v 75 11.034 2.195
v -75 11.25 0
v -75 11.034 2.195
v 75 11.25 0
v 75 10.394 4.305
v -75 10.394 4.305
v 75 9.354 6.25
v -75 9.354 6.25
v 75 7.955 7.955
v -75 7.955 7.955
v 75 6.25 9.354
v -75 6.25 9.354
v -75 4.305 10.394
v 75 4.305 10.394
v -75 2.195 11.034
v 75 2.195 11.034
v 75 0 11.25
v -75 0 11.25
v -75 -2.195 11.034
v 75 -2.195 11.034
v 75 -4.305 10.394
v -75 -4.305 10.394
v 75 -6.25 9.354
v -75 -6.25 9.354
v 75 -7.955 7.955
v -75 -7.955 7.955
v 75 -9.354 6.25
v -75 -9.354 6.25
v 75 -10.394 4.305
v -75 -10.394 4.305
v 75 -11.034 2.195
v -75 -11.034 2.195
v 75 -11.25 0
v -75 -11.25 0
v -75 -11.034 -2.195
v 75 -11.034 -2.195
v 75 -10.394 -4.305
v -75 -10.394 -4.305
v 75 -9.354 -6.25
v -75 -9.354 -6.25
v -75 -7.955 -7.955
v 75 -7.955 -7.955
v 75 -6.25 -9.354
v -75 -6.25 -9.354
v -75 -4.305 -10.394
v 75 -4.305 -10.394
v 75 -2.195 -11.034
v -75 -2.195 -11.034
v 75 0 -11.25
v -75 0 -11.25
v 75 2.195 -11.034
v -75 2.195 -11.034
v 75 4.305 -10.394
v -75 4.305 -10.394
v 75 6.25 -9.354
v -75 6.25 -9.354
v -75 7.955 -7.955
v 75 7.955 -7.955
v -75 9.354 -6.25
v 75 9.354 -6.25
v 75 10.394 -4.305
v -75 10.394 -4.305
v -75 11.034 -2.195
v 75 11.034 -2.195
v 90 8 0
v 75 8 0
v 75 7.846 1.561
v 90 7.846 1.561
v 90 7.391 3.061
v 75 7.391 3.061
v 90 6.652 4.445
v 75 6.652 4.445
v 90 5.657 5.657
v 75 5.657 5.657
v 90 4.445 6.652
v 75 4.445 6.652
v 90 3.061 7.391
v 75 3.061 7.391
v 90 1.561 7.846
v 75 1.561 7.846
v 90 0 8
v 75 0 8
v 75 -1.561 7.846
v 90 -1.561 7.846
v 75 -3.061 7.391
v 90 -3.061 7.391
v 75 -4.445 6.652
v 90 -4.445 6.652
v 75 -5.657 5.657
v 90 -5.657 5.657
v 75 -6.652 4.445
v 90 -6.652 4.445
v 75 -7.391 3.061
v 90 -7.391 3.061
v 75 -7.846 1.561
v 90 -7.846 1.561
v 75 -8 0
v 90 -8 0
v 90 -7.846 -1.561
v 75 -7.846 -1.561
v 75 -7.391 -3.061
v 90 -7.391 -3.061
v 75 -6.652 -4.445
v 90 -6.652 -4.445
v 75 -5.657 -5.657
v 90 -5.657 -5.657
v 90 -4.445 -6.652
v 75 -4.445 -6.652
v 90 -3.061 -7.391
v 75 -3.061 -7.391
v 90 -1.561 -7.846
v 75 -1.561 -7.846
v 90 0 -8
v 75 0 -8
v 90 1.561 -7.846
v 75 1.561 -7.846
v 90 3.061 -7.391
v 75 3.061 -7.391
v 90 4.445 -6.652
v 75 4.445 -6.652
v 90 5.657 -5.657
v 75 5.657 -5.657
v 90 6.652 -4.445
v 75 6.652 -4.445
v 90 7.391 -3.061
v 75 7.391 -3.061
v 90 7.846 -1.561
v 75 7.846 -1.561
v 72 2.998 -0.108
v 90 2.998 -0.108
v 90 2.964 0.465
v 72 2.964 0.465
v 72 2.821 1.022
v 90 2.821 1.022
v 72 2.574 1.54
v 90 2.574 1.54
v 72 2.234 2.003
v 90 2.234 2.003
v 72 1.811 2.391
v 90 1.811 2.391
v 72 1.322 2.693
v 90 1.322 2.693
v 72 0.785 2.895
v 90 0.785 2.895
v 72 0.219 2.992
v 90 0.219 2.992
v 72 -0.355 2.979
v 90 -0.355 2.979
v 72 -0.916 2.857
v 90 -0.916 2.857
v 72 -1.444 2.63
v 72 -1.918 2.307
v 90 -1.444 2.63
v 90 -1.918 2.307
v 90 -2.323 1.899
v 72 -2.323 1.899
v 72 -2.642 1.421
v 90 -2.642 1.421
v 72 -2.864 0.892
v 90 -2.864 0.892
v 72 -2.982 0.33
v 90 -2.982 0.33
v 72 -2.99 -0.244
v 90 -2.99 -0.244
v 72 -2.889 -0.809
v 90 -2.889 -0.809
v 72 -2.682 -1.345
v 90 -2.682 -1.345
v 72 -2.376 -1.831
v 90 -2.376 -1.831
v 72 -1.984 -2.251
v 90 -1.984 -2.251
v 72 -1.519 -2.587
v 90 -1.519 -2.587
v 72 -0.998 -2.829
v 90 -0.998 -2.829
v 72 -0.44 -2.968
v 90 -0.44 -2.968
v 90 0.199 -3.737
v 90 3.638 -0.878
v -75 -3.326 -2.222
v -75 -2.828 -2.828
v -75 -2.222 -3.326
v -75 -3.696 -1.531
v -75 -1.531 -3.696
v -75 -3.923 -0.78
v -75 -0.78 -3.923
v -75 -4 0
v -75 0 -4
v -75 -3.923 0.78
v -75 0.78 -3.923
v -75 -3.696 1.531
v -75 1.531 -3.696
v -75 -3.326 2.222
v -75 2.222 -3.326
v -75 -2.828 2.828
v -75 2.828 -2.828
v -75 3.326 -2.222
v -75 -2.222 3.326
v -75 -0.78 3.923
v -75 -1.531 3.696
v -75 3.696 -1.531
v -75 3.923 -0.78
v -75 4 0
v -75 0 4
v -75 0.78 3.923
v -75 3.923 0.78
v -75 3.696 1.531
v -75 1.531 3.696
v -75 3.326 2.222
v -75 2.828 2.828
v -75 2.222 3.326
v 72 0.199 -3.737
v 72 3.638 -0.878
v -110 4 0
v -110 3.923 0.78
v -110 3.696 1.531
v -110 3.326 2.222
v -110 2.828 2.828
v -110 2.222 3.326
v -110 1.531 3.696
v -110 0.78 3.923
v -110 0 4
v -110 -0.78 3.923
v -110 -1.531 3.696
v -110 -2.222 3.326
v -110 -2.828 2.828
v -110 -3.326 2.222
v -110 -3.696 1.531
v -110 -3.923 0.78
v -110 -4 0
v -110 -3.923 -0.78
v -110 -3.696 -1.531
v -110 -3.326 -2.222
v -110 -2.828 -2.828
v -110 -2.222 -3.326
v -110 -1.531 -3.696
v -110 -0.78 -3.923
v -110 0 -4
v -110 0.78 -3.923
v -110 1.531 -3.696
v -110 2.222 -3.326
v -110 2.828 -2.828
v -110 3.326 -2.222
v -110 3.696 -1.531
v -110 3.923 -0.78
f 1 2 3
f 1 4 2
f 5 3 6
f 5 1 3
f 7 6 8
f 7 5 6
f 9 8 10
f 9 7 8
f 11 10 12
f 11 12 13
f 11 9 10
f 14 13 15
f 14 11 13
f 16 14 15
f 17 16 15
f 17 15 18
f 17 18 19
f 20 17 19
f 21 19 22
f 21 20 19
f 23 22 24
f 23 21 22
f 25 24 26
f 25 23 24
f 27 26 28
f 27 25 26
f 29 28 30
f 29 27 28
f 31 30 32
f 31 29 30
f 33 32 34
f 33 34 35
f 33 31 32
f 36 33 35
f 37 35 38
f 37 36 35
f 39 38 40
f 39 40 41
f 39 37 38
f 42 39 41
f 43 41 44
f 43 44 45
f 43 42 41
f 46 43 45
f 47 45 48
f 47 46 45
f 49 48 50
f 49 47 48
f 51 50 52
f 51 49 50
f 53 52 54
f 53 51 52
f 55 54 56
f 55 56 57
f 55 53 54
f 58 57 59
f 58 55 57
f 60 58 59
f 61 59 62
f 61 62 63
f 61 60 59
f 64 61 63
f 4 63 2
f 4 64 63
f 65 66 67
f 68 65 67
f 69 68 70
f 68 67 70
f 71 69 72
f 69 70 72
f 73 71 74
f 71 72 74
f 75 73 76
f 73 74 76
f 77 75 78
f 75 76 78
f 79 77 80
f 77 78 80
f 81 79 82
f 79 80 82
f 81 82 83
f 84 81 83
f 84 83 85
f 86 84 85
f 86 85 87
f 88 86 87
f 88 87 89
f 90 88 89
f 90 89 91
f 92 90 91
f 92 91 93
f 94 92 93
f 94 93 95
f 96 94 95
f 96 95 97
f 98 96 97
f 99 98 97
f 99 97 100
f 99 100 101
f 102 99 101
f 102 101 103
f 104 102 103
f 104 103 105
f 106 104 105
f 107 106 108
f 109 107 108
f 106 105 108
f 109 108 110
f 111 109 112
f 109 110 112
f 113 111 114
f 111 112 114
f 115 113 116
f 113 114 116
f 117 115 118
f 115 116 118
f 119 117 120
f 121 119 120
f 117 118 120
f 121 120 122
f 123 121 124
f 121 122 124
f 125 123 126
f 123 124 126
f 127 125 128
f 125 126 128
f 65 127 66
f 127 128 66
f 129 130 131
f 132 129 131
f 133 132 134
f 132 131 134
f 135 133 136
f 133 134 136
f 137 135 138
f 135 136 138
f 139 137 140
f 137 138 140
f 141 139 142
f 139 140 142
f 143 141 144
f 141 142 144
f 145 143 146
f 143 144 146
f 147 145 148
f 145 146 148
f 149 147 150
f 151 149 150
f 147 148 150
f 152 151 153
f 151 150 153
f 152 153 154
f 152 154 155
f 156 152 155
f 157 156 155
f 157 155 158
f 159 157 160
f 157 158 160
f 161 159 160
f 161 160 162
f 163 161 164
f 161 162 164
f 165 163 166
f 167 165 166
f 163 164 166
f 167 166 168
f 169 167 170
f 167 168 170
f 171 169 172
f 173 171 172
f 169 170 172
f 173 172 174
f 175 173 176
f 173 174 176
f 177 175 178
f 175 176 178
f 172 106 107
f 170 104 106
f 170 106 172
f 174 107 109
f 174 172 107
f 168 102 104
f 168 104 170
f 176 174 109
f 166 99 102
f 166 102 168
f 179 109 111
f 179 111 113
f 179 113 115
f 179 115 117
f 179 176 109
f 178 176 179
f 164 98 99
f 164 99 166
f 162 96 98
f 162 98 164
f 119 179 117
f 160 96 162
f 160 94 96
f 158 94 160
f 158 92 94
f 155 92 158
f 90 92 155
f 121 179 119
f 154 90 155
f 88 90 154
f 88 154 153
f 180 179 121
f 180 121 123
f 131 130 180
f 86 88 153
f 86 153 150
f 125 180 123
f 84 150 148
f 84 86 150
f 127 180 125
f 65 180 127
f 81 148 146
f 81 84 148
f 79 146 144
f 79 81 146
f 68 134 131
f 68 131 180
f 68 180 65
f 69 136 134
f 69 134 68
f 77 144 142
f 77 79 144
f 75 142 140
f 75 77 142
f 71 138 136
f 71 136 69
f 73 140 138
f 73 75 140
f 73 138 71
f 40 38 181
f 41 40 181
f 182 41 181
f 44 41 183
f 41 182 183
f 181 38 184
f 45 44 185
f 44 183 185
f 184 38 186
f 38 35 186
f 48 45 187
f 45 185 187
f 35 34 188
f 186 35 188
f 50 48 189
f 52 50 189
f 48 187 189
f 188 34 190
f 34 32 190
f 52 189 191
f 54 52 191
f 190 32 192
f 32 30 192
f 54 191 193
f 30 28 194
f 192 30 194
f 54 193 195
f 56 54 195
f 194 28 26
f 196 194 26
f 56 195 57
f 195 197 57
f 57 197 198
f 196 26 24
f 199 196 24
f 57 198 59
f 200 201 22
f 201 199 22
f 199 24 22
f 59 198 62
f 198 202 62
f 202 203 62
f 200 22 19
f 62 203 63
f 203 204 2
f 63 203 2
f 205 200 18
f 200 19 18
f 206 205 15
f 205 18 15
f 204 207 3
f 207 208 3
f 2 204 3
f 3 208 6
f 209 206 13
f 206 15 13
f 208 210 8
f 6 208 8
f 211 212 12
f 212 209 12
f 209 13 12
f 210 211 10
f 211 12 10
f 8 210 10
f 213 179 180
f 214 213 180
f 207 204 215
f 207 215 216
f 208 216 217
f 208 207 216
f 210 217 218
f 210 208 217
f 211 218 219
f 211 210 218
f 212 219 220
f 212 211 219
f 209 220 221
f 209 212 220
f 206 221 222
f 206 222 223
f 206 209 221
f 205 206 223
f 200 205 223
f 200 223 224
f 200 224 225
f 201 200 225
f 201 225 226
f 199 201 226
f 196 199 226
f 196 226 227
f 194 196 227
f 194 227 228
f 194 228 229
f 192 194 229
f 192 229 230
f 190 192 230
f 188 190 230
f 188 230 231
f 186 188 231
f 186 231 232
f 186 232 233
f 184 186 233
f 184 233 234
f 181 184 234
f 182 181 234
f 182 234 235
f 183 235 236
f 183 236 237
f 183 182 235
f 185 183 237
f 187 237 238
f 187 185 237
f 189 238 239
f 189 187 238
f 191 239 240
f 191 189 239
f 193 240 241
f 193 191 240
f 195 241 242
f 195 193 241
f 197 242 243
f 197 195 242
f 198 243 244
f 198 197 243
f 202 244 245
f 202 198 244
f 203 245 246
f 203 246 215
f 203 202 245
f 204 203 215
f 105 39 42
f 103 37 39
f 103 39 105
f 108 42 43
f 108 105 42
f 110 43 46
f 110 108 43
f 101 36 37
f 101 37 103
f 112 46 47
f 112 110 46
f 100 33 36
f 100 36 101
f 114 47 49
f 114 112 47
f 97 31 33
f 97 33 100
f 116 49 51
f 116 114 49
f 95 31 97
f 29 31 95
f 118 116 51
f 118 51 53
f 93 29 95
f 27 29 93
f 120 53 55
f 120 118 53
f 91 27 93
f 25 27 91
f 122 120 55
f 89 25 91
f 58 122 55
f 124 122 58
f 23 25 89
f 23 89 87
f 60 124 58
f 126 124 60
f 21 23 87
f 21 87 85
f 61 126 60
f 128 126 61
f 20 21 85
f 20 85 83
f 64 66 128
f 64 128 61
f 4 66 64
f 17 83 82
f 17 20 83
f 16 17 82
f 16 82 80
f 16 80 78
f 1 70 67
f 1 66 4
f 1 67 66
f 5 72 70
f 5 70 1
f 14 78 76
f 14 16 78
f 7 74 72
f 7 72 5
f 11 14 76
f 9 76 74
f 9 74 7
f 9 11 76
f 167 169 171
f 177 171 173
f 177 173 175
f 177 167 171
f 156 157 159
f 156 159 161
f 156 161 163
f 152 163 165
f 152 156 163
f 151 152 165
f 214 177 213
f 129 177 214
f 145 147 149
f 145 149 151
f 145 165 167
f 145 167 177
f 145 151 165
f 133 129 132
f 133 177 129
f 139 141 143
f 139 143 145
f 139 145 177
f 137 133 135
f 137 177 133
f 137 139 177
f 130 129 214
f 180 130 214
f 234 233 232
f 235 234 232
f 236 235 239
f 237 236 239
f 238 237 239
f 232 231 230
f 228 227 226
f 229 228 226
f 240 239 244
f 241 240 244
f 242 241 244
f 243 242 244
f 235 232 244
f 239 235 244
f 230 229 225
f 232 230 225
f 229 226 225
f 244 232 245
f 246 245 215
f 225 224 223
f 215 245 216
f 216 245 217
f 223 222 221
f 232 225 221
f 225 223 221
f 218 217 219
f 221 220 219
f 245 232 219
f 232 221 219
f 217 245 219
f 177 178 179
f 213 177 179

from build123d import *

# Parameters (mm, degrees)
SKETCH026_R     = 4
PAD015_DEPTH    = 110
SKETCH027_R     = 11.25
PAD016_DEPTH    = 75
SKETCH029_R     = 8
PAD017_DEPTH    = 90
POCKET012_DEPTH = 18


with BuildPart() as part:
    # Sketch026 → Pad015 (new body)
    with BuildSketch(Plane.YZ):
        Circle(SKETCH026_R)
    extrude(amount=-PAD015_DEPTH)

    # Sketch027 → Pad016 (new body, symmetric)
    with BuildSketch(Plane.YZ):
        Circle(SKETCH027_R)
    extrude(amount=PAD016_DEPTH, both=True)

    # Sketch029 → Pad017 (new body)
    with BuildSketch(Plane.YZ):
        Circle(SKETCH029_R)
    extrude(amount=PAD017_DEPTH)

    # Sketch028 → Pocket012 (cut)
    with BuildSketch(Plane.YZ.offset(90)):
        with BuildLine():
            ThreePointArc((2.99806, -0.107877), (-1.918287, 2.306551), (-0.44036, -2.967505))
            Line((-0.44036, -2.967505), (0.198883, -3.73651))
            Line((0.198883, -3.73651), (3.637995, -0.877715))
            Line((2.99806, -0.107877), (3.637995, -0.877715))
        make_face()
    extrude(amount=-POCKET012_DEPTH, mode=Mode.SUBTRACT)


solid = part.part
